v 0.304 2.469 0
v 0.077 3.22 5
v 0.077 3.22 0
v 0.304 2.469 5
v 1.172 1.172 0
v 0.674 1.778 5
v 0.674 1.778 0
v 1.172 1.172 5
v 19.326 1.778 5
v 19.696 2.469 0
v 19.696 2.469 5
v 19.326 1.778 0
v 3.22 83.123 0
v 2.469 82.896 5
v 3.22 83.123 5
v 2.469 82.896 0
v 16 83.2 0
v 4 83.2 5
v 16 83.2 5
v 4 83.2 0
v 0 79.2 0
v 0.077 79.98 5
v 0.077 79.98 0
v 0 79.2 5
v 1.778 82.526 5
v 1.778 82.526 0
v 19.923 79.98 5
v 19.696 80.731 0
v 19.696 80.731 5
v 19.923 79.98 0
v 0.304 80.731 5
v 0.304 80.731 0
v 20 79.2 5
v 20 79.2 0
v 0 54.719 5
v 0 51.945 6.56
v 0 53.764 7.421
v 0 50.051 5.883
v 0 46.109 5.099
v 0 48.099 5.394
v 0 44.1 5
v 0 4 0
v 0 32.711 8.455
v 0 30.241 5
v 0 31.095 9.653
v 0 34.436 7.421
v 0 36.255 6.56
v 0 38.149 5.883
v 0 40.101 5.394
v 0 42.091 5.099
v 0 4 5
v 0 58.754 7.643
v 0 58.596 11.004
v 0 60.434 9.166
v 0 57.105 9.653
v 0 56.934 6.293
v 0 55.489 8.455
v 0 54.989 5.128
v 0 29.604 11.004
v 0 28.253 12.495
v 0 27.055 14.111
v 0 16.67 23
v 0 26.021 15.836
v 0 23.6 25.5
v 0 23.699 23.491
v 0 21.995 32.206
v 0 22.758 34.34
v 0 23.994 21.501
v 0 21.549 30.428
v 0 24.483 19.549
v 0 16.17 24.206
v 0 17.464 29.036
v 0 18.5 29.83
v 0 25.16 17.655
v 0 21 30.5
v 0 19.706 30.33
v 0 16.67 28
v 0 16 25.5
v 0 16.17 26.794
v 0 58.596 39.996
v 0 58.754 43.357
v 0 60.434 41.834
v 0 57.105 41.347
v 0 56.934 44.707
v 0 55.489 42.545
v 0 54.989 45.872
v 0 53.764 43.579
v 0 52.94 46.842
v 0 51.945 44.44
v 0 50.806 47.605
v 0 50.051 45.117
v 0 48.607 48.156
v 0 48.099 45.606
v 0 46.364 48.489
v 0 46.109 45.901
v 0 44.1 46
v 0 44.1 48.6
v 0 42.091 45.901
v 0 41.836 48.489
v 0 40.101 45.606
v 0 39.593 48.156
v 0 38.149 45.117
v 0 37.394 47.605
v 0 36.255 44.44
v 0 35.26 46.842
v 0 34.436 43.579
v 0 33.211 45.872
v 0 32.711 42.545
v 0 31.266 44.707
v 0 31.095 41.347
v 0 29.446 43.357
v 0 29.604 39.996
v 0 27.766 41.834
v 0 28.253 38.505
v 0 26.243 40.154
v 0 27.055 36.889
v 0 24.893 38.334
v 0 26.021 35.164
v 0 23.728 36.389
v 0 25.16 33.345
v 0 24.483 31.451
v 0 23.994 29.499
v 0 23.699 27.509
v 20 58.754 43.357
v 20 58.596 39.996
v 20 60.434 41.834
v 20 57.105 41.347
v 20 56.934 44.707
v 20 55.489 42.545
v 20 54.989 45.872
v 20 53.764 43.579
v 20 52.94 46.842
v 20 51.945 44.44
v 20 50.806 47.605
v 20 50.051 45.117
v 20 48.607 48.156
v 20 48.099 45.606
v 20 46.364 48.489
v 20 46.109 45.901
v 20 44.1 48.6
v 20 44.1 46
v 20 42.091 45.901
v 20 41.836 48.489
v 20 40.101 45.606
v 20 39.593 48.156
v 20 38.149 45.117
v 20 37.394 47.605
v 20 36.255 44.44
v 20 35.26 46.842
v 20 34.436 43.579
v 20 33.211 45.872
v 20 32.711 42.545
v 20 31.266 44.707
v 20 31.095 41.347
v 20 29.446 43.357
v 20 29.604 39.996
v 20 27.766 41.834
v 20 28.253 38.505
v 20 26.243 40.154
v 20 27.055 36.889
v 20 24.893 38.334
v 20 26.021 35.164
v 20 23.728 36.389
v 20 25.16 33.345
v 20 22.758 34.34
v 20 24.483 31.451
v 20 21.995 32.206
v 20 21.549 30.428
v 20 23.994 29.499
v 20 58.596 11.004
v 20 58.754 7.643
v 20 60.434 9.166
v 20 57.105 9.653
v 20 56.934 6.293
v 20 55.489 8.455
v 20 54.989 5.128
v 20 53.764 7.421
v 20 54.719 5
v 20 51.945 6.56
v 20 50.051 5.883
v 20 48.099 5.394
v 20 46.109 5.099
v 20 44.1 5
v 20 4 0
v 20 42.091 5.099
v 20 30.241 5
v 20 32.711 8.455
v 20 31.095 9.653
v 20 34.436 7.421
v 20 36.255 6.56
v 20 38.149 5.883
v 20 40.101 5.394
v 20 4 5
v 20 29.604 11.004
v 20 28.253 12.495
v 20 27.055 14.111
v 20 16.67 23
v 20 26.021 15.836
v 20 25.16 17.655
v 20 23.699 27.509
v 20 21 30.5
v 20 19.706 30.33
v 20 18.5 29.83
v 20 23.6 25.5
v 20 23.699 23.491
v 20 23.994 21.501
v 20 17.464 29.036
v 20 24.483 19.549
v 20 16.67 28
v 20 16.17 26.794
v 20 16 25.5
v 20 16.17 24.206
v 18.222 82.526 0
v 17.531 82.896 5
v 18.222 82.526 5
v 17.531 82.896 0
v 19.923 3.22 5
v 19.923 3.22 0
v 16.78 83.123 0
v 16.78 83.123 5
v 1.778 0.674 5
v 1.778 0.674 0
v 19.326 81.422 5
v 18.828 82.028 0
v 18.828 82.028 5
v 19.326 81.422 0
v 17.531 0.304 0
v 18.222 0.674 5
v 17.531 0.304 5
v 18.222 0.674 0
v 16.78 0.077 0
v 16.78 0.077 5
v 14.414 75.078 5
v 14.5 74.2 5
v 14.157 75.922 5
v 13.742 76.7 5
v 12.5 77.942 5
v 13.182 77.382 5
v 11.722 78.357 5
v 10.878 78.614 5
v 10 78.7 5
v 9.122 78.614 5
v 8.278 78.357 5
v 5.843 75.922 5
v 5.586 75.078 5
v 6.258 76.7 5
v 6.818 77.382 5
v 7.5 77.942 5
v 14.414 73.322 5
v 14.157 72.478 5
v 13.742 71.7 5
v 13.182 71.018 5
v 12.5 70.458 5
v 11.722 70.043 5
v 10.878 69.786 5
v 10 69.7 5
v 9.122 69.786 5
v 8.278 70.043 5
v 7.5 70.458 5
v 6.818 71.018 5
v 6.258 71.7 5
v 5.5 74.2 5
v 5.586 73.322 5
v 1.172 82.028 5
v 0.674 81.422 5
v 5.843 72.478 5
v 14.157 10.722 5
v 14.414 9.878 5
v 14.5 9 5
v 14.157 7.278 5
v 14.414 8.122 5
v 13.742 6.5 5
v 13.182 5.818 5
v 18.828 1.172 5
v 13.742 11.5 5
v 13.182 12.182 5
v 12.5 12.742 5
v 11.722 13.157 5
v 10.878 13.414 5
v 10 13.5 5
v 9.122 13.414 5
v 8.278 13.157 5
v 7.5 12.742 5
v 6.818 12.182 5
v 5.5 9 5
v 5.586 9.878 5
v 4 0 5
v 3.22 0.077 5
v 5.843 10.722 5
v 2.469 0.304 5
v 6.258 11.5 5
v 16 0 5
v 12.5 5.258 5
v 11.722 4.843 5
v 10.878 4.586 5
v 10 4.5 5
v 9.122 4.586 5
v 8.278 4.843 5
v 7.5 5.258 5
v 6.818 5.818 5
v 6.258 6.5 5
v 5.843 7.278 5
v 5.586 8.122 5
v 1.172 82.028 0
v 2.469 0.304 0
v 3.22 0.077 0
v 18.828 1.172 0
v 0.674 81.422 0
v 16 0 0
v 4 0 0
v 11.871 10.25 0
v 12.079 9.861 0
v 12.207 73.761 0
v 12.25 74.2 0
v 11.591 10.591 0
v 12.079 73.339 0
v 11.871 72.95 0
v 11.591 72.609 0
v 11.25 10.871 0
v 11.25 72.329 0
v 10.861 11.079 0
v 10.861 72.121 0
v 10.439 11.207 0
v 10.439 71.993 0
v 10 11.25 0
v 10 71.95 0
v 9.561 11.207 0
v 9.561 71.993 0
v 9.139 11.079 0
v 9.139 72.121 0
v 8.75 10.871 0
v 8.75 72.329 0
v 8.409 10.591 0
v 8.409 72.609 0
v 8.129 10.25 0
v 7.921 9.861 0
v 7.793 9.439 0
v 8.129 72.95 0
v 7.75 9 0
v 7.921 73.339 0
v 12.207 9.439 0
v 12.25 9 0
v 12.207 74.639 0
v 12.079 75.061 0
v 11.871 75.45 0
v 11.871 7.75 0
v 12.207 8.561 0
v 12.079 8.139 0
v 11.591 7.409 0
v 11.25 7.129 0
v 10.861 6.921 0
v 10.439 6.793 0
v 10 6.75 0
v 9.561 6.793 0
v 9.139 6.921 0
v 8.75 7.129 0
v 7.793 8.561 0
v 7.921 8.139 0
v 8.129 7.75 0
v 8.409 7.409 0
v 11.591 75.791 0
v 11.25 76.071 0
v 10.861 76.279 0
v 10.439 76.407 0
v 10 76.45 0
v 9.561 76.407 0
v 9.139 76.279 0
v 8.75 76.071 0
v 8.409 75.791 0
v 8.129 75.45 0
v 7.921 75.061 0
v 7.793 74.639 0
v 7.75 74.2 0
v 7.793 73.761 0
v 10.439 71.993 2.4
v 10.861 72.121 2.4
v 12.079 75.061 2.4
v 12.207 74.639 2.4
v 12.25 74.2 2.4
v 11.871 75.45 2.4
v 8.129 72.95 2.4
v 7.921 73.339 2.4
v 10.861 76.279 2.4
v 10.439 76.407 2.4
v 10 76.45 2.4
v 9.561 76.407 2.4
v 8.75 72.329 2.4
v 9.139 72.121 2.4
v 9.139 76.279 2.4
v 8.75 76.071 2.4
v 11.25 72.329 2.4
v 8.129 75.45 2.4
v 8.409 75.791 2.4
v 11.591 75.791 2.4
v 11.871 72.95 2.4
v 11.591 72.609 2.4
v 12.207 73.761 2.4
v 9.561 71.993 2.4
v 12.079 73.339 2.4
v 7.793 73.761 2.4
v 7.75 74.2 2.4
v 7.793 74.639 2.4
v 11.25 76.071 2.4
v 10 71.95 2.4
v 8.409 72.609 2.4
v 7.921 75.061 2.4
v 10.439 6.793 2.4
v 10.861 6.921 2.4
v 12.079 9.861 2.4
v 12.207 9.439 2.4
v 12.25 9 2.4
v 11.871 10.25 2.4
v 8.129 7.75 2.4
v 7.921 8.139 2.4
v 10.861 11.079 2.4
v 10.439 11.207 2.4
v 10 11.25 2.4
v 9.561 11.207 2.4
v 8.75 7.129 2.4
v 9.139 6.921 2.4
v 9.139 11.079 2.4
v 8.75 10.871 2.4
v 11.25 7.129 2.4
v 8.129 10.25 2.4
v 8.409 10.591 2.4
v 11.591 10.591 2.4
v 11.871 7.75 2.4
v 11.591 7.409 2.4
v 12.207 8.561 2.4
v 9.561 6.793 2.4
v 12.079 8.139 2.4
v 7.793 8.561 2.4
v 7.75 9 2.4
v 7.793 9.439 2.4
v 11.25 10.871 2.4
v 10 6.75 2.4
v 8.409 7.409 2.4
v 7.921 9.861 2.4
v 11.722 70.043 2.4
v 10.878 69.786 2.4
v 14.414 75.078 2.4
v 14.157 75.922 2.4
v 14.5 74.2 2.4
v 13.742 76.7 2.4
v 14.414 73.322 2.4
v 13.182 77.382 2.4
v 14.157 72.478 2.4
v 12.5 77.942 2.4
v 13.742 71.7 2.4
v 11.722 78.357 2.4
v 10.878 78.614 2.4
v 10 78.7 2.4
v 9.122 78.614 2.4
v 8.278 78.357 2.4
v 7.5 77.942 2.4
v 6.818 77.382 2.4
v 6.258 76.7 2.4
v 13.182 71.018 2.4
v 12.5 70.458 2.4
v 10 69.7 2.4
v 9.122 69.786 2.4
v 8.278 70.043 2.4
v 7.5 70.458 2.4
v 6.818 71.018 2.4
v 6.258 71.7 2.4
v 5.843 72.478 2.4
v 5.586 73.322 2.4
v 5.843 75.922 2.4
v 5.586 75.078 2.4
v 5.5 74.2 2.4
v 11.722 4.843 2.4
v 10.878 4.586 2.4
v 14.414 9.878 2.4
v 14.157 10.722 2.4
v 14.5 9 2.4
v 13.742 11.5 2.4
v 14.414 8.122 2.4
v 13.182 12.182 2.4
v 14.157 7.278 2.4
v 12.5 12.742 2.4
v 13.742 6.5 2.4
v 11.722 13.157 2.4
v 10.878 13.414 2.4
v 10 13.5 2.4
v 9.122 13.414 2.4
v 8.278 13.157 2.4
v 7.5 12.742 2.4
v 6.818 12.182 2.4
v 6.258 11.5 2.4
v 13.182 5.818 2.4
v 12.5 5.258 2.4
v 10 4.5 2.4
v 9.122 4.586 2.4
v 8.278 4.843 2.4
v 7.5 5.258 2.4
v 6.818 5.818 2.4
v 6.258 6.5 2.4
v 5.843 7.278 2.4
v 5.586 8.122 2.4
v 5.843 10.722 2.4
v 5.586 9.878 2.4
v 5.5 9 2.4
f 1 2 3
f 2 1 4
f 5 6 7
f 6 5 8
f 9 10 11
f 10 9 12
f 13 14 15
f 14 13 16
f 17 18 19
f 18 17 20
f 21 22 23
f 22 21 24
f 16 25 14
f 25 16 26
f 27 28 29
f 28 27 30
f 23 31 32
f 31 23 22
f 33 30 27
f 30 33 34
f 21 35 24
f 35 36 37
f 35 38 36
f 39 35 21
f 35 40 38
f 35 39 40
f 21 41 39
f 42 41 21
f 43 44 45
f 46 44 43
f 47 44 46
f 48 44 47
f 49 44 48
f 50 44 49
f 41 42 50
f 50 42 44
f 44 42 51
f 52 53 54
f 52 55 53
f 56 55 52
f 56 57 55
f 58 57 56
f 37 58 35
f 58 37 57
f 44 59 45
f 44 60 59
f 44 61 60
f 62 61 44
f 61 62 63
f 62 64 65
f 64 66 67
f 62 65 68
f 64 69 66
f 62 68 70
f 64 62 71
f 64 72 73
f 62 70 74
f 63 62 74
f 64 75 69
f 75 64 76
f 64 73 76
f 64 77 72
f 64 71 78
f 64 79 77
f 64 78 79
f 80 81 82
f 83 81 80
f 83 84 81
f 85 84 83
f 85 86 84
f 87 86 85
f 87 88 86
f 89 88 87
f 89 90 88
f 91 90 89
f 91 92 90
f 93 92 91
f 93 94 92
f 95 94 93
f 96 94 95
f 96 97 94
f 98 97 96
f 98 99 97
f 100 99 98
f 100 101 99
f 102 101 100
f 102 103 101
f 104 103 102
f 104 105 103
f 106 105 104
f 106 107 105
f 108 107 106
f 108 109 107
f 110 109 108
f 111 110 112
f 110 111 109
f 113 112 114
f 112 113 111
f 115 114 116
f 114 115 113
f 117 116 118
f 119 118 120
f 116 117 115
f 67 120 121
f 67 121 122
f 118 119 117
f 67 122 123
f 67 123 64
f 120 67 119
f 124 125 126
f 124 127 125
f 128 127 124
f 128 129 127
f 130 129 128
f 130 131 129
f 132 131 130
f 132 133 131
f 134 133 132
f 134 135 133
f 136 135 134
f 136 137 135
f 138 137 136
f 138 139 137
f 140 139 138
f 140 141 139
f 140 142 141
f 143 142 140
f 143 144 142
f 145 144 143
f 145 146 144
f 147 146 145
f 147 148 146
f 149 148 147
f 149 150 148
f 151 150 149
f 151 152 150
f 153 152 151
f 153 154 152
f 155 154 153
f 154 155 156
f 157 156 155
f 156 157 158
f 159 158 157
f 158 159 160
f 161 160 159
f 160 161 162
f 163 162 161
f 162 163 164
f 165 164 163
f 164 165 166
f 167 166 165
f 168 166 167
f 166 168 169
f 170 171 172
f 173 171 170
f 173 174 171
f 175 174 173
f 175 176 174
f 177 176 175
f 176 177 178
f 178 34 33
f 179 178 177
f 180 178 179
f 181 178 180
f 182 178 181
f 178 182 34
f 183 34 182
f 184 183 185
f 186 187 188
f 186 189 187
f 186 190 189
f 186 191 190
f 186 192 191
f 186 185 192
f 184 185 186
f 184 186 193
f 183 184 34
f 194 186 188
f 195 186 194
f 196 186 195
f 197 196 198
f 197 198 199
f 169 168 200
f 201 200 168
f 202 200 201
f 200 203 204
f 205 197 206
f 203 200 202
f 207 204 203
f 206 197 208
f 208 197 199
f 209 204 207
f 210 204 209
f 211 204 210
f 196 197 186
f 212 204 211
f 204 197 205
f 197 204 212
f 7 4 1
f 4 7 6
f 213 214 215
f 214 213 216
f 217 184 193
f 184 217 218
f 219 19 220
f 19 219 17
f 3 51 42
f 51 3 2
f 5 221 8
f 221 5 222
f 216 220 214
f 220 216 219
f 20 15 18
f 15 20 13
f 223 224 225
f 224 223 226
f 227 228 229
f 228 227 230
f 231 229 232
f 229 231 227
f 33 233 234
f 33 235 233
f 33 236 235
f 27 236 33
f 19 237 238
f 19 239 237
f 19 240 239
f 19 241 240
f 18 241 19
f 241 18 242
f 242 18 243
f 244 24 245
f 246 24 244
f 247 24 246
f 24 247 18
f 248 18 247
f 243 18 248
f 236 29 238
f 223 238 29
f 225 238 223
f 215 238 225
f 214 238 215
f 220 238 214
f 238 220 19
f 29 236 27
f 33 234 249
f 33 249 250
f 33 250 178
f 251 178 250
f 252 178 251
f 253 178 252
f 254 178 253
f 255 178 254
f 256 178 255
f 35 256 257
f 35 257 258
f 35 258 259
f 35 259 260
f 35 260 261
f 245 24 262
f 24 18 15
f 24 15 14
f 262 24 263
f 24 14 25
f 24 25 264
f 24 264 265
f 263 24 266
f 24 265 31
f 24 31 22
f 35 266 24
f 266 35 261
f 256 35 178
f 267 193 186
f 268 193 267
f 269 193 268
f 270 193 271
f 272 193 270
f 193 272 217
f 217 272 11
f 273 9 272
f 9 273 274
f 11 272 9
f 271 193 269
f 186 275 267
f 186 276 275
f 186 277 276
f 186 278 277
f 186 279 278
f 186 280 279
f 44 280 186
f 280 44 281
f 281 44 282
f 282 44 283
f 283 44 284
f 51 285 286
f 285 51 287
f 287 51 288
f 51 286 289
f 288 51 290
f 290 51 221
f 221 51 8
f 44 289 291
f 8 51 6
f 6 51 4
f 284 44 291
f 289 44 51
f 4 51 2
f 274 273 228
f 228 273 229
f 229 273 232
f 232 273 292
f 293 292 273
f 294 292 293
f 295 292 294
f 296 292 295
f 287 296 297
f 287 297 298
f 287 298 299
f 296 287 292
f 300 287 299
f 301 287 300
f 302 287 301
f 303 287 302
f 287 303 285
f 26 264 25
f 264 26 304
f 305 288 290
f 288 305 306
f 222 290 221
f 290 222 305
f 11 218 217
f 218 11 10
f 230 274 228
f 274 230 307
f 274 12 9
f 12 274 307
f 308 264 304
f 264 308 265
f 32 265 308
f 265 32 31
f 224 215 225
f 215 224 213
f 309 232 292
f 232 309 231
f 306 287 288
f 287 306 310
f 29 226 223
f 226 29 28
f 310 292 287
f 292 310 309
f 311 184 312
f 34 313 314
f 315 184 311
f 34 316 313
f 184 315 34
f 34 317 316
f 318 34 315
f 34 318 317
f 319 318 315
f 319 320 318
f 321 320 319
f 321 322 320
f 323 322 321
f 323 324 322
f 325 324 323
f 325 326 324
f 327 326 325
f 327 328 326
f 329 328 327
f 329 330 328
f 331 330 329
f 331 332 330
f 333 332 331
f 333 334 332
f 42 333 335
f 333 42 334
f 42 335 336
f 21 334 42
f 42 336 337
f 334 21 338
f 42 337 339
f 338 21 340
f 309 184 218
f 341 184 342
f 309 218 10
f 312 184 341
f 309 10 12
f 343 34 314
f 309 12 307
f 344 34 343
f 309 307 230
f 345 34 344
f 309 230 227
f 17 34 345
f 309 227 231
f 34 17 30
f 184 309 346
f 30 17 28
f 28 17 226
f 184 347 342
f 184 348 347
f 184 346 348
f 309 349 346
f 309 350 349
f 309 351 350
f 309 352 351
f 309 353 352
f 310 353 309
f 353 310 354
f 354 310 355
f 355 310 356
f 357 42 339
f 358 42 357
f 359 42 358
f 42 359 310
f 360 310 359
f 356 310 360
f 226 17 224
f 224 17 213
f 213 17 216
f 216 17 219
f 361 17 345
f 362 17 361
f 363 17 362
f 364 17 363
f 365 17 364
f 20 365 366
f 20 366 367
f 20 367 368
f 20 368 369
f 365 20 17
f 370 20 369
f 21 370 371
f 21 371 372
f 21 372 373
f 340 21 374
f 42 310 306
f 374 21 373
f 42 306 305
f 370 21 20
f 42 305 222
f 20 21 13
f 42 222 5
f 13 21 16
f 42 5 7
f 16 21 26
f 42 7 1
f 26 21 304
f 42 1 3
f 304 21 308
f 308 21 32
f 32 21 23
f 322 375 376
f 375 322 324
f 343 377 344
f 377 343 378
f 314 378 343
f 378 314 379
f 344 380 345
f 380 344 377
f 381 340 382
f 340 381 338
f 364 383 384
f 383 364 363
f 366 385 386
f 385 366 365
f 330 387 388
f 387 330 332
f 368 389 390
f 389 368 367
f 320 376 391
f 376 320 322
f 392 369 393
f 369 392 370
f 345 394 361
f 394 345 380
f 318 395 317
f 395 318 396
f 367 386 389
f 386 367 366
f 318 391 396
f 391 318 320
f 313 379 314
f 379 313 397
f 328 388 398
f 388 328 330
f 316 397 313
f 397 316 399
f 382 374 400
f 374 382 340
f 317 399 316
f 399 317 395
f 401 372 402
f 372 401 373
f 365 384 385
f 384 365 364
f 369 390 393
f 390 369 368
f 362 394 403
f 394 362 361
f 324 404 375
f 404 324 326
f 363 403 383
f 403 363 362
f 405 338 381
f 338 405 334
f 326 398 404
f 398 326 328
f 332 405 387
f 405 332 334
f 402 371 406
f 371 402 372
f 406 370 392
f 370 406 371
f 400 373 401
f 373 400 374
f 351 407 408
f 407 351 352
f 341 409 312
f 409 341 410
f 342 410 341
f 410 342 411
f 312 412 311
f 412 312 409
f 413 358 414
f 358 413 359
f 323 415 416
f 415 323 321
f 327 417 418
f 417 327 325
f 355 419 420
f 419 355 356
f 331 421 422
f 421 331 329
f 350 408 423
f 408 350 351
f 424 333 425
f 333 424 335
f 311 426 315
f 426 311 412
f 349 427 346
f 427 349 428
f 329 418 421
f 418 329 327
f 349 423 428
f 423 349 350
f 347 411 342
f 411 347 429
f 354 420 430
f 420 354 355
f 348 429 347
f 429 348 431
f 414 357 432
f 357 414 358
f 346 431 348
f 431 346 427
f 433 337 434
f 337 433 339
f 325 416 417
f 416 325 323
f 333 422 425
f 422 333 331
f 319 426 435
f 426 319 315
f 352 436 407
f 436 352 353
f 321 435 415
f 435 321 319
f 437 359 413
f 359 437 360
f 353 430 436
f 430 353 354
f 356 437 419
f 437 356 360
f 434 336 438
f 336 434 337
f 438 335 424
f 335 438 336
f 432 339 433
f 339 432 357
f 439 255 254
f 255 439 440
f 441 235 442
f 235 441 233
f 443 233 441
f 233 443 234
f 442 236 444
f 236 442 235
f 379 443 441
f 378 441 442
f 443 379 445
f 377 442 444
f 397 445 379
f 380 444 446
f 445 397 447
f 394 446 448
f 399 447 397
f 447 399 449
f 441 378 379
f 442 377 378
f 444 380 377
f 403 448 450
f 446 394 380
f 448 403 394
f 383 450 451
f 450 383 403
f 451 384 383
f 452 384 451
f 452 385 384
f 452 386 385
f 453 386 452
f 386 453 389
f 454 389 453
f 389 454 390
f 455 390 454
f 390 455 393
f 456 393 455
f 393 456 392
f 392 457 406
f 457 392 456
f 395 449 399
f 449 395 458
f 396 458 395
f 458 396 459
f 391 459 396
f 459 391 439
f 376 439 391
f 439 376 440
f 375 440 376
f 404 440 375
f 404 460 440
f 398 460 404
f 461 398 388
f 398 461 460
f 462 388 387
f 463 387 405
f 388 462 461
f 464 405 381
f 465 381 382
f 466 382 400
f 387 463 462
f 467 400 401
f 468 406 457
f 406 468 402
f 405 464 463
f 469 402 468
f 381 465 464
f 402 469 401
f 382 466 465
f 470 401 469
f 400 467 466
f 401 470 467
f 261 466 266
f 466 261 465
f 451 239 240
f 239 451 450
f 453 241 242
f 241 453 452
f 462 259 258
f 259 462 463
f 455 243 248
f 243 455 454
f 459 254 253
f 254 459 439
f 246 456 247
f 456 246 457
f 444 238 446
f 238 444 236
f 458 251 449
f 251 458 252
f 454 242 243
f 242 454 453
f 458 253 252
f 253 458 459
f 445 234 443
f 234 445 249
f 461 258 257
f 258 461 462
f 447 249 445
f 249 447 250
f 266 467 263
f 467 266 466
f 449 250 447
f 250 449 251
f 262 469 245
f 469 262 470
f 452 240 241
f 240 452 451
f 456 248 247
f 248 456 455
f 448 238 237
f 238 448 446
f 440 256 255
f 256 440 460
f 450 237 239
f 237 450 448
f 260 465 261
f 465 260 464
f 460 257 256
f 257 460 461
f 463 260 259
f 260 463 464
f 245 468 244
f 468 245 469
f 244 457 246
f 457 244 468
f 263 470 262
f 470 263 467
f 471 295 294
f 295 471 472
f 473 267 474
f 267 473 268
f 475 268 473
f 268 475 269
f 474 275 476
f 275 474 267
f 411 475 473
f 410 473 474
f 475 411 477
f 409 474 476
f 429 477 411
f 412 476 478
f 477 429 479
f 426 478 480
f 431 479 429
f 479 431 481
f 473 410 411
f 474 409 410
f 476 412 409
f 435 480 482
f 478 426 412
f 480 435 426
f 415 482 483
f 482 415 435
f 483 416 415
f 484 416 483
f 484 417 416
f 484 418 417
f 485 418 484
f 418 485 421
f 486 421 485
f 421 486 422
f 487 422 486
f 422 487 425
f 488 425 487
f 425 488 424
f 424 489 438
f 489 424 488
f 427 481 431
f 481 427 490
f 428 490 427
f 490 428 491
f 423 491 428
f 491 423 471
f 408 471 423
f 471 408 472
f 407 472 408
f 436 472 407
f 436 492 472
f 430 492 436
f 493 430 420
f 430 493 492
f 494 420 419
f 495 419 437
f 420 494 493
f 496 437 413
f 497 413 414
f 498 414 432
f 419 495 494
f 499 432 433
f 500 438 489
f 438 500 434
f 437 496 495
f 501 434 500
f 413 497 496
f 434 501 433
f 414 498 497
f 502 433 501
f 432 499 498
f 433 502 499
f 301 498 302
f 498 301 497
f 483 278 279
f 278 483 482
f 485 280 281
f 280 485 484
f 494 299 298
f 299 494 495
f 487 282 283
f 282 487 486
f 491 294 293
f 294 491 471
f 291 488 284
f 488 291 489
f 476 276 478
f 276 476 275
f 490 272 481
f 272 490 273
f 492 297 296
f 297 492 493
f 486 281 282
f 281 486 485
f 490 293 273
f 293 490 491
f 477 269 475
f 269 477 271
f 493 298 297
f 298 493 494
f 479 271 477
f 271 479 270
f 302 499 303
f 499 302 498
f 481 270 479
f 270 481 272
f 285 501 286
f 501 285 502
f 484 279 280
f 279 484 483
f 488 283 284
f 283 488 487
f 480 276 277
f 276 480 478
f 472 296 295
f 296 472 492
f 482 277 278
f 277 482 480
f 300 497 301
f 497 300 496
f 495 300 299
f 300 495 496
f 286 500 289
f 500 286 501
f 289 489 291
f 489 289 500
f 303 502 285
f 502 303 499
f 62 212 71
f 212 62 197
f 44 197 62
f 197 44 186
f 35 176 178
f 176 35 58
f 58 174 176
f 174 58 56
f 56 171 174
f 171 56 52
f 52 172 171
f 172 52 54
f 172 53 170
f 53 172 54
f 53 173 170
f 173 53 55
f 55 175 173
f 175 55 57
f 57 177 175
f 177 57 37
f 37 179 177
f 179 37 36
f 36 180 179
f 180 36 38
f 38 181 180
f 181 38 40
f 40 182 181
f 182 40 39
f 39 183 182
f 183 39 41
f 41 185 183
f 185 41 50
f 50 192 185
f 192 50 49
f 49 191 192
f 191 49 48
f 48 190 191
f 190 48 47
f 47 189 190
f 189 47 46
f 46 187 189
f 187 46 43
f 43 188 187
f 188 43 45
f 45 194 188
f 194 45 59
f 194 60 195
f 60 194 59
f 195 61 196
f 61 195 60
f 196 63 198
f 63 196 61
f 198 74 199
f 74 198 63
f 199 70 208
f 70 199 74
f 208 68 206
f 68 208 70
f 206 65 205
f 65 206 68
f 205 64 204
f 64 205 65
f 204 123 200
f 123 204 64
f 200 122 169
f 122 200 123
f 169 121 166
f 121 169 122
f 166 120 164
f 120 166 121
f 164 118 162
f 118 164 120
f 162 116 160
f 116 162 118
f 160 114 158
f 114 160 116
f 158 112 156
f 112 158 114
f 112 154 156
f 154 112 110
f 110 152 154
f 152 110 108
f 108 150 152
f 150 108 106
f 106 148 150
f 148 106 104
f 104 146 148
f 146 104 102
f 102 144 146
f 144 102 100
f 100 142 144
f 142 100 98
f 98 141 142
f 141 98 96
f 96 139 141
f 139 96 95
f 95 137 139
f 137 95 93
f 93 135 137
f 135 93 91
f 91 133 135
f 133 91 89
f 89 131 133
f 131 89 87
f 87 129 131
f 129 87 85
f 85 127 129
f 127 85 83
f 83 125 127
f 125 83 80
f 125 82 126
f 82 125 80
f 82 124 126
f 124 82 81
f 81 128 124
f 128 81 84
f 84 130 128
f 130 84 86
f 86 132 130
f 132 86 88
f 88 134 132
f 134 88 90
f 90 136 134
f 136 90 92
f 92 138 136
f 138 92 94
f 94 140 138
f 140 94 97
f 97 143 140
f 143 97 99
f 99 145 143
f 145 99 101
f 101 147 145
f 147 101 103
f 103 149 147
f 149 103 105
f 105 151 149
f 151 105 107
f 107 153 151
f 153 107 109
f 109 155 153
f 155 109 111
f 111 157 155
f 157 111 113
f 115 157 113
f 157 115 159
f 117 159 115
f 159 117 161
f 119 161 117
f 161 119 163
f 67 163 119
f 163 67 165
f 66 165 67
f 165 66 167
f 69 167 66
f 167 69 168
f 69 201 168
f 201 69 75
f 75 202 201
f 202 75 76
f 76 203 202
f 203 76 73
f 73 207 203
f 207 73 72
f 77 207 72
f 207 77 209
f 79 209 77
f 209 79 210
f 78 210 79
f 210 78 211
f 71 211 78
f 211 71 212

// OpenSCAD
// Wall-mounted snap-in cradle for a vacuum hose running along the wall.
// Meant to be printed multiple times and spaced along the hose's run;
// screws to a wall/pegboard, hose snaps in from the top into a "C" cradle
// and is held by the springiness of the two arm tips.
//
// Axes: X = along the wall / along the hose run, Y = vertical, Z = out from the wall.

// ---- Edit these for your hose/screws ----
hose_od       = 40;   // measured hose OD (mm)
fit_clearance = 1;    // extra diametral clearance so the hose isn't overly tight
clip_wall     = 2.6;  // radial thickness of the cradle band (thin = flexes to snap)
clip_depth    = 20;   // width of this clip's band along the hose run (X)
gap_deg       = 90;   // total opening angle at the top where the hose snaps in

screw_margin  = 16;   // extra plate length above/below the cradle for screws
plate_thickness = 5;
plate_corner_r  = 4;

screw_hole_d    = 4.5; // clearance hole for a #8 wood screw
screw_head_d    = 9;   // counterbore diameter for the screw head
screw_head_depth = 2.6;
screw_edge_inset = 9;  // screw hole center distance from top/bottom plate edge

gusset_r = 5;          // thickness (radius) of the brace under the cradle

$fn_circle = 64;

// ---- Derived dimensions ----
clip_ir = (hose_od + fit_clearance) / 2;
clip_or = clip_ir + clip_wall;

cradle_offset_y = 5;   // shift the cradle up from center, clearing the bottom screw for a screwdriver

plate_w = clip_depth;   // plate is exactly as wide as the clip along the hose run (X)
plate_h = 2 * clip_or + 2 * screw_margin + cradle_offset_y;  // extra length added at the top, to keep the same clearance there after the shift

cx = plate_w / 2;
cy = clip_or + screw_margin + cradle_offset_y;   // cradle's vertical center (shifted up from plate center)

gap_start = 90 - gap_deg / 2;
gap_end   = 90 + gap_deg / 2;
arc_start = gap_end;
arc_end   = gap_start + 360;

screw_z_top    = plate_h - screw_edge_inset;
screw_z_bottom = screw_edge_inset;

module rounded_rect(w, h, r) {
    hull() {
        for (x = [r, w - r], y = [r, h - r])
            translate([x, y, 0])
                circle(r = r, $fn = 32);
    }
}

// Pie-slice / wedge from a1 to a2 degrees (measured counterclockwise from +X)
module pie(r, a1, a2) {
    steps = max(6, ceil((a2 - a1) / 360 * $fn_circle));
    points = concat([[0, 0]],
        [for (i = [0:steps])
            let (a = a1 + (a2 - a1) * i / steps)
            [r * cos(a), r * sin(a)]]);
    polygon(points);
}

// Brace filling the gap between the ring's lower outer surface and the wall
// plate (native +x embeds into the plate; see cradle() below). Drawn before
// the bore is cut, so it can be sized generously with no risk of narrowing
// the hose clearance. The root anchor is centered at the plate's mid-thickness
// with a capped radius so it can never poke through the front or back face.
gusset_root_r = min(gusset_r, plate_thickness / 2 - 0.3);

module gusset_2d() {
    hull() {
        translate([0, -clip_or]) circle(r = gusset_r, $fn = 24);
        translate([clip_ir + plate_thickness / 2, -clip_or * 0.4]) circle(r = gusset_root_r, $fn = 24);
    }
}

module cradle_2d() {
    difference() {
        union() {
            intersection() {
                circle(r = clip_or, $fn = $fn_circle);
                pie(clip_or + 2, arc_start, arc_end);
            }
            gusset_2d();
        }
        circle(r = clip_ir, $fn = $fn_circle);
    }
}

module screw_hole() {
    cylinder(h = plate_thickness + 2, r = screw_hole_d / 2, $fn = 32);
}

module screw_counterbore() {
    translate([0, 0, plate_thickness - screw_head_depth])
        cylinder(h = screw_head_depth + 1, r = screw_head_d / 2, $fn = 32);
}

module wall_plate() {
    difference() {
        linear_extrude(height = plate_thickness)
            rounded_rect(plate_w, plate_h, plate_corner_r);

        translate([cx, screw_z_top, -1]) screw_hole();
        translate([cx, screw_z_bottom, -1]) screw_hole();
        translate([cx, screw_z_top, 0]) screw_counterbore();
        translate([cx, screw_z_bottom, 0]) screw_counterbore();
    }
}

// Ring profile is drawn in native X/Y with the gap at +Y (up), then rotated
// so the extrusion runs along world X (along the wall) instead of world Z,
// while its local Y axis (gap direction) stays mapped to world Y (vertical).
module cradle() {
    translate([(plate_w - clip_depth) / 2, cy, plate_thickness + clip_ir])
        rotate([0, 90, 0])
            linear_extrude(height = clip_depth)
                cradle_2d();
}

union() {
    wall_plate();
    cradle();
}
